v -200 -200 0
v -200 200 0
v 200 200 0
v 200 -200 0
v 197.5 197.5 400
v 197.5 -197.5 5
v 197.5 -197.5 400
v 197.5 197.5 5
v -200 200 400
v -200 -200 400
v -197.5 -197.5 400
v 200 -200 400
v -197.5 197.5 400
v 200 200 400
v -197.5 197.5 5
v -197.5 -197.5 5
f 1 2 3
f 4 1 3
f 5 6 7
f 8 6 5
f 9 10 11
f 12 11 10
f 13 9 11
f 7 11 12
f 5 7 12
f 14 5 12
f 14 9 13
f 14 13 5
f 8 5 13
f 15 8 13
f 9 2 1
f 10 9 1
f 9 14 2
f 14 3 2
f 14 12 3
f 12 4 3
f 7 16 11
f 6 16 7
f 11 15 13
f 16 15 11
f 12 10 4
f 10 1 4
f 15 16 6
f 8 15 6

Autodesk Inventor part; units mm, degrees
ref_plane "YZ Plane" through (0, 0, 0) normal (1, 0, 0) x (0, 1, 0)
ref_plane "XZ Plane" through (0, 0, 0) normal (0, 1, 0) x (-1, 0, 0)
ref_plane "XY Plane" through (0, 0, 0) normal (0, 0, 1) x (1, 0, 0)
sketch "Boceto1" plane through (0, 0, 0) normal (0, 0, 1) x (1, 0, 0)
  line L0 (-200, -200) -> (200, -200)
  line L1 (200, -200) -> (200, 200)
  line L2 (200, 200) -> (-200, 200)
  line L3 (-200, 200) -> (-200, -200)
  line L4 (-200, -200) -> (200, 200) construction
  line L5 (200, -200) -> (-200, 200) construction
  line L6 (-197.5, -197.5) -> (197.5, -197.5)
  line L7 (197.5, -197.5) -> (197.5, 197.5)
  line L8 (197.5, 197.5) -> (-197.5, 197.5)
  line L9 (-197.5, 197.5) -> (-197.5, -197.5)
  line L10 (-197.5, -197.5) -> (197.5, 197.5) construction
  line L11 (197.5, -197.5) -> (-197.5, 197.5) construction
  point P0 (0, 0)
  dimension "d0" = 400
  dimension "d1" = 400
  dimension "d2" = 395
  dimension "d3" = 395
extrude "Extrusión1" add sketch "Boceto1" along normal blind 5 contours L9 L8 L7 L6
extrude "Extrusión2" add sketch "Boceto1" along normal blind 400
properties part number "BOX"
